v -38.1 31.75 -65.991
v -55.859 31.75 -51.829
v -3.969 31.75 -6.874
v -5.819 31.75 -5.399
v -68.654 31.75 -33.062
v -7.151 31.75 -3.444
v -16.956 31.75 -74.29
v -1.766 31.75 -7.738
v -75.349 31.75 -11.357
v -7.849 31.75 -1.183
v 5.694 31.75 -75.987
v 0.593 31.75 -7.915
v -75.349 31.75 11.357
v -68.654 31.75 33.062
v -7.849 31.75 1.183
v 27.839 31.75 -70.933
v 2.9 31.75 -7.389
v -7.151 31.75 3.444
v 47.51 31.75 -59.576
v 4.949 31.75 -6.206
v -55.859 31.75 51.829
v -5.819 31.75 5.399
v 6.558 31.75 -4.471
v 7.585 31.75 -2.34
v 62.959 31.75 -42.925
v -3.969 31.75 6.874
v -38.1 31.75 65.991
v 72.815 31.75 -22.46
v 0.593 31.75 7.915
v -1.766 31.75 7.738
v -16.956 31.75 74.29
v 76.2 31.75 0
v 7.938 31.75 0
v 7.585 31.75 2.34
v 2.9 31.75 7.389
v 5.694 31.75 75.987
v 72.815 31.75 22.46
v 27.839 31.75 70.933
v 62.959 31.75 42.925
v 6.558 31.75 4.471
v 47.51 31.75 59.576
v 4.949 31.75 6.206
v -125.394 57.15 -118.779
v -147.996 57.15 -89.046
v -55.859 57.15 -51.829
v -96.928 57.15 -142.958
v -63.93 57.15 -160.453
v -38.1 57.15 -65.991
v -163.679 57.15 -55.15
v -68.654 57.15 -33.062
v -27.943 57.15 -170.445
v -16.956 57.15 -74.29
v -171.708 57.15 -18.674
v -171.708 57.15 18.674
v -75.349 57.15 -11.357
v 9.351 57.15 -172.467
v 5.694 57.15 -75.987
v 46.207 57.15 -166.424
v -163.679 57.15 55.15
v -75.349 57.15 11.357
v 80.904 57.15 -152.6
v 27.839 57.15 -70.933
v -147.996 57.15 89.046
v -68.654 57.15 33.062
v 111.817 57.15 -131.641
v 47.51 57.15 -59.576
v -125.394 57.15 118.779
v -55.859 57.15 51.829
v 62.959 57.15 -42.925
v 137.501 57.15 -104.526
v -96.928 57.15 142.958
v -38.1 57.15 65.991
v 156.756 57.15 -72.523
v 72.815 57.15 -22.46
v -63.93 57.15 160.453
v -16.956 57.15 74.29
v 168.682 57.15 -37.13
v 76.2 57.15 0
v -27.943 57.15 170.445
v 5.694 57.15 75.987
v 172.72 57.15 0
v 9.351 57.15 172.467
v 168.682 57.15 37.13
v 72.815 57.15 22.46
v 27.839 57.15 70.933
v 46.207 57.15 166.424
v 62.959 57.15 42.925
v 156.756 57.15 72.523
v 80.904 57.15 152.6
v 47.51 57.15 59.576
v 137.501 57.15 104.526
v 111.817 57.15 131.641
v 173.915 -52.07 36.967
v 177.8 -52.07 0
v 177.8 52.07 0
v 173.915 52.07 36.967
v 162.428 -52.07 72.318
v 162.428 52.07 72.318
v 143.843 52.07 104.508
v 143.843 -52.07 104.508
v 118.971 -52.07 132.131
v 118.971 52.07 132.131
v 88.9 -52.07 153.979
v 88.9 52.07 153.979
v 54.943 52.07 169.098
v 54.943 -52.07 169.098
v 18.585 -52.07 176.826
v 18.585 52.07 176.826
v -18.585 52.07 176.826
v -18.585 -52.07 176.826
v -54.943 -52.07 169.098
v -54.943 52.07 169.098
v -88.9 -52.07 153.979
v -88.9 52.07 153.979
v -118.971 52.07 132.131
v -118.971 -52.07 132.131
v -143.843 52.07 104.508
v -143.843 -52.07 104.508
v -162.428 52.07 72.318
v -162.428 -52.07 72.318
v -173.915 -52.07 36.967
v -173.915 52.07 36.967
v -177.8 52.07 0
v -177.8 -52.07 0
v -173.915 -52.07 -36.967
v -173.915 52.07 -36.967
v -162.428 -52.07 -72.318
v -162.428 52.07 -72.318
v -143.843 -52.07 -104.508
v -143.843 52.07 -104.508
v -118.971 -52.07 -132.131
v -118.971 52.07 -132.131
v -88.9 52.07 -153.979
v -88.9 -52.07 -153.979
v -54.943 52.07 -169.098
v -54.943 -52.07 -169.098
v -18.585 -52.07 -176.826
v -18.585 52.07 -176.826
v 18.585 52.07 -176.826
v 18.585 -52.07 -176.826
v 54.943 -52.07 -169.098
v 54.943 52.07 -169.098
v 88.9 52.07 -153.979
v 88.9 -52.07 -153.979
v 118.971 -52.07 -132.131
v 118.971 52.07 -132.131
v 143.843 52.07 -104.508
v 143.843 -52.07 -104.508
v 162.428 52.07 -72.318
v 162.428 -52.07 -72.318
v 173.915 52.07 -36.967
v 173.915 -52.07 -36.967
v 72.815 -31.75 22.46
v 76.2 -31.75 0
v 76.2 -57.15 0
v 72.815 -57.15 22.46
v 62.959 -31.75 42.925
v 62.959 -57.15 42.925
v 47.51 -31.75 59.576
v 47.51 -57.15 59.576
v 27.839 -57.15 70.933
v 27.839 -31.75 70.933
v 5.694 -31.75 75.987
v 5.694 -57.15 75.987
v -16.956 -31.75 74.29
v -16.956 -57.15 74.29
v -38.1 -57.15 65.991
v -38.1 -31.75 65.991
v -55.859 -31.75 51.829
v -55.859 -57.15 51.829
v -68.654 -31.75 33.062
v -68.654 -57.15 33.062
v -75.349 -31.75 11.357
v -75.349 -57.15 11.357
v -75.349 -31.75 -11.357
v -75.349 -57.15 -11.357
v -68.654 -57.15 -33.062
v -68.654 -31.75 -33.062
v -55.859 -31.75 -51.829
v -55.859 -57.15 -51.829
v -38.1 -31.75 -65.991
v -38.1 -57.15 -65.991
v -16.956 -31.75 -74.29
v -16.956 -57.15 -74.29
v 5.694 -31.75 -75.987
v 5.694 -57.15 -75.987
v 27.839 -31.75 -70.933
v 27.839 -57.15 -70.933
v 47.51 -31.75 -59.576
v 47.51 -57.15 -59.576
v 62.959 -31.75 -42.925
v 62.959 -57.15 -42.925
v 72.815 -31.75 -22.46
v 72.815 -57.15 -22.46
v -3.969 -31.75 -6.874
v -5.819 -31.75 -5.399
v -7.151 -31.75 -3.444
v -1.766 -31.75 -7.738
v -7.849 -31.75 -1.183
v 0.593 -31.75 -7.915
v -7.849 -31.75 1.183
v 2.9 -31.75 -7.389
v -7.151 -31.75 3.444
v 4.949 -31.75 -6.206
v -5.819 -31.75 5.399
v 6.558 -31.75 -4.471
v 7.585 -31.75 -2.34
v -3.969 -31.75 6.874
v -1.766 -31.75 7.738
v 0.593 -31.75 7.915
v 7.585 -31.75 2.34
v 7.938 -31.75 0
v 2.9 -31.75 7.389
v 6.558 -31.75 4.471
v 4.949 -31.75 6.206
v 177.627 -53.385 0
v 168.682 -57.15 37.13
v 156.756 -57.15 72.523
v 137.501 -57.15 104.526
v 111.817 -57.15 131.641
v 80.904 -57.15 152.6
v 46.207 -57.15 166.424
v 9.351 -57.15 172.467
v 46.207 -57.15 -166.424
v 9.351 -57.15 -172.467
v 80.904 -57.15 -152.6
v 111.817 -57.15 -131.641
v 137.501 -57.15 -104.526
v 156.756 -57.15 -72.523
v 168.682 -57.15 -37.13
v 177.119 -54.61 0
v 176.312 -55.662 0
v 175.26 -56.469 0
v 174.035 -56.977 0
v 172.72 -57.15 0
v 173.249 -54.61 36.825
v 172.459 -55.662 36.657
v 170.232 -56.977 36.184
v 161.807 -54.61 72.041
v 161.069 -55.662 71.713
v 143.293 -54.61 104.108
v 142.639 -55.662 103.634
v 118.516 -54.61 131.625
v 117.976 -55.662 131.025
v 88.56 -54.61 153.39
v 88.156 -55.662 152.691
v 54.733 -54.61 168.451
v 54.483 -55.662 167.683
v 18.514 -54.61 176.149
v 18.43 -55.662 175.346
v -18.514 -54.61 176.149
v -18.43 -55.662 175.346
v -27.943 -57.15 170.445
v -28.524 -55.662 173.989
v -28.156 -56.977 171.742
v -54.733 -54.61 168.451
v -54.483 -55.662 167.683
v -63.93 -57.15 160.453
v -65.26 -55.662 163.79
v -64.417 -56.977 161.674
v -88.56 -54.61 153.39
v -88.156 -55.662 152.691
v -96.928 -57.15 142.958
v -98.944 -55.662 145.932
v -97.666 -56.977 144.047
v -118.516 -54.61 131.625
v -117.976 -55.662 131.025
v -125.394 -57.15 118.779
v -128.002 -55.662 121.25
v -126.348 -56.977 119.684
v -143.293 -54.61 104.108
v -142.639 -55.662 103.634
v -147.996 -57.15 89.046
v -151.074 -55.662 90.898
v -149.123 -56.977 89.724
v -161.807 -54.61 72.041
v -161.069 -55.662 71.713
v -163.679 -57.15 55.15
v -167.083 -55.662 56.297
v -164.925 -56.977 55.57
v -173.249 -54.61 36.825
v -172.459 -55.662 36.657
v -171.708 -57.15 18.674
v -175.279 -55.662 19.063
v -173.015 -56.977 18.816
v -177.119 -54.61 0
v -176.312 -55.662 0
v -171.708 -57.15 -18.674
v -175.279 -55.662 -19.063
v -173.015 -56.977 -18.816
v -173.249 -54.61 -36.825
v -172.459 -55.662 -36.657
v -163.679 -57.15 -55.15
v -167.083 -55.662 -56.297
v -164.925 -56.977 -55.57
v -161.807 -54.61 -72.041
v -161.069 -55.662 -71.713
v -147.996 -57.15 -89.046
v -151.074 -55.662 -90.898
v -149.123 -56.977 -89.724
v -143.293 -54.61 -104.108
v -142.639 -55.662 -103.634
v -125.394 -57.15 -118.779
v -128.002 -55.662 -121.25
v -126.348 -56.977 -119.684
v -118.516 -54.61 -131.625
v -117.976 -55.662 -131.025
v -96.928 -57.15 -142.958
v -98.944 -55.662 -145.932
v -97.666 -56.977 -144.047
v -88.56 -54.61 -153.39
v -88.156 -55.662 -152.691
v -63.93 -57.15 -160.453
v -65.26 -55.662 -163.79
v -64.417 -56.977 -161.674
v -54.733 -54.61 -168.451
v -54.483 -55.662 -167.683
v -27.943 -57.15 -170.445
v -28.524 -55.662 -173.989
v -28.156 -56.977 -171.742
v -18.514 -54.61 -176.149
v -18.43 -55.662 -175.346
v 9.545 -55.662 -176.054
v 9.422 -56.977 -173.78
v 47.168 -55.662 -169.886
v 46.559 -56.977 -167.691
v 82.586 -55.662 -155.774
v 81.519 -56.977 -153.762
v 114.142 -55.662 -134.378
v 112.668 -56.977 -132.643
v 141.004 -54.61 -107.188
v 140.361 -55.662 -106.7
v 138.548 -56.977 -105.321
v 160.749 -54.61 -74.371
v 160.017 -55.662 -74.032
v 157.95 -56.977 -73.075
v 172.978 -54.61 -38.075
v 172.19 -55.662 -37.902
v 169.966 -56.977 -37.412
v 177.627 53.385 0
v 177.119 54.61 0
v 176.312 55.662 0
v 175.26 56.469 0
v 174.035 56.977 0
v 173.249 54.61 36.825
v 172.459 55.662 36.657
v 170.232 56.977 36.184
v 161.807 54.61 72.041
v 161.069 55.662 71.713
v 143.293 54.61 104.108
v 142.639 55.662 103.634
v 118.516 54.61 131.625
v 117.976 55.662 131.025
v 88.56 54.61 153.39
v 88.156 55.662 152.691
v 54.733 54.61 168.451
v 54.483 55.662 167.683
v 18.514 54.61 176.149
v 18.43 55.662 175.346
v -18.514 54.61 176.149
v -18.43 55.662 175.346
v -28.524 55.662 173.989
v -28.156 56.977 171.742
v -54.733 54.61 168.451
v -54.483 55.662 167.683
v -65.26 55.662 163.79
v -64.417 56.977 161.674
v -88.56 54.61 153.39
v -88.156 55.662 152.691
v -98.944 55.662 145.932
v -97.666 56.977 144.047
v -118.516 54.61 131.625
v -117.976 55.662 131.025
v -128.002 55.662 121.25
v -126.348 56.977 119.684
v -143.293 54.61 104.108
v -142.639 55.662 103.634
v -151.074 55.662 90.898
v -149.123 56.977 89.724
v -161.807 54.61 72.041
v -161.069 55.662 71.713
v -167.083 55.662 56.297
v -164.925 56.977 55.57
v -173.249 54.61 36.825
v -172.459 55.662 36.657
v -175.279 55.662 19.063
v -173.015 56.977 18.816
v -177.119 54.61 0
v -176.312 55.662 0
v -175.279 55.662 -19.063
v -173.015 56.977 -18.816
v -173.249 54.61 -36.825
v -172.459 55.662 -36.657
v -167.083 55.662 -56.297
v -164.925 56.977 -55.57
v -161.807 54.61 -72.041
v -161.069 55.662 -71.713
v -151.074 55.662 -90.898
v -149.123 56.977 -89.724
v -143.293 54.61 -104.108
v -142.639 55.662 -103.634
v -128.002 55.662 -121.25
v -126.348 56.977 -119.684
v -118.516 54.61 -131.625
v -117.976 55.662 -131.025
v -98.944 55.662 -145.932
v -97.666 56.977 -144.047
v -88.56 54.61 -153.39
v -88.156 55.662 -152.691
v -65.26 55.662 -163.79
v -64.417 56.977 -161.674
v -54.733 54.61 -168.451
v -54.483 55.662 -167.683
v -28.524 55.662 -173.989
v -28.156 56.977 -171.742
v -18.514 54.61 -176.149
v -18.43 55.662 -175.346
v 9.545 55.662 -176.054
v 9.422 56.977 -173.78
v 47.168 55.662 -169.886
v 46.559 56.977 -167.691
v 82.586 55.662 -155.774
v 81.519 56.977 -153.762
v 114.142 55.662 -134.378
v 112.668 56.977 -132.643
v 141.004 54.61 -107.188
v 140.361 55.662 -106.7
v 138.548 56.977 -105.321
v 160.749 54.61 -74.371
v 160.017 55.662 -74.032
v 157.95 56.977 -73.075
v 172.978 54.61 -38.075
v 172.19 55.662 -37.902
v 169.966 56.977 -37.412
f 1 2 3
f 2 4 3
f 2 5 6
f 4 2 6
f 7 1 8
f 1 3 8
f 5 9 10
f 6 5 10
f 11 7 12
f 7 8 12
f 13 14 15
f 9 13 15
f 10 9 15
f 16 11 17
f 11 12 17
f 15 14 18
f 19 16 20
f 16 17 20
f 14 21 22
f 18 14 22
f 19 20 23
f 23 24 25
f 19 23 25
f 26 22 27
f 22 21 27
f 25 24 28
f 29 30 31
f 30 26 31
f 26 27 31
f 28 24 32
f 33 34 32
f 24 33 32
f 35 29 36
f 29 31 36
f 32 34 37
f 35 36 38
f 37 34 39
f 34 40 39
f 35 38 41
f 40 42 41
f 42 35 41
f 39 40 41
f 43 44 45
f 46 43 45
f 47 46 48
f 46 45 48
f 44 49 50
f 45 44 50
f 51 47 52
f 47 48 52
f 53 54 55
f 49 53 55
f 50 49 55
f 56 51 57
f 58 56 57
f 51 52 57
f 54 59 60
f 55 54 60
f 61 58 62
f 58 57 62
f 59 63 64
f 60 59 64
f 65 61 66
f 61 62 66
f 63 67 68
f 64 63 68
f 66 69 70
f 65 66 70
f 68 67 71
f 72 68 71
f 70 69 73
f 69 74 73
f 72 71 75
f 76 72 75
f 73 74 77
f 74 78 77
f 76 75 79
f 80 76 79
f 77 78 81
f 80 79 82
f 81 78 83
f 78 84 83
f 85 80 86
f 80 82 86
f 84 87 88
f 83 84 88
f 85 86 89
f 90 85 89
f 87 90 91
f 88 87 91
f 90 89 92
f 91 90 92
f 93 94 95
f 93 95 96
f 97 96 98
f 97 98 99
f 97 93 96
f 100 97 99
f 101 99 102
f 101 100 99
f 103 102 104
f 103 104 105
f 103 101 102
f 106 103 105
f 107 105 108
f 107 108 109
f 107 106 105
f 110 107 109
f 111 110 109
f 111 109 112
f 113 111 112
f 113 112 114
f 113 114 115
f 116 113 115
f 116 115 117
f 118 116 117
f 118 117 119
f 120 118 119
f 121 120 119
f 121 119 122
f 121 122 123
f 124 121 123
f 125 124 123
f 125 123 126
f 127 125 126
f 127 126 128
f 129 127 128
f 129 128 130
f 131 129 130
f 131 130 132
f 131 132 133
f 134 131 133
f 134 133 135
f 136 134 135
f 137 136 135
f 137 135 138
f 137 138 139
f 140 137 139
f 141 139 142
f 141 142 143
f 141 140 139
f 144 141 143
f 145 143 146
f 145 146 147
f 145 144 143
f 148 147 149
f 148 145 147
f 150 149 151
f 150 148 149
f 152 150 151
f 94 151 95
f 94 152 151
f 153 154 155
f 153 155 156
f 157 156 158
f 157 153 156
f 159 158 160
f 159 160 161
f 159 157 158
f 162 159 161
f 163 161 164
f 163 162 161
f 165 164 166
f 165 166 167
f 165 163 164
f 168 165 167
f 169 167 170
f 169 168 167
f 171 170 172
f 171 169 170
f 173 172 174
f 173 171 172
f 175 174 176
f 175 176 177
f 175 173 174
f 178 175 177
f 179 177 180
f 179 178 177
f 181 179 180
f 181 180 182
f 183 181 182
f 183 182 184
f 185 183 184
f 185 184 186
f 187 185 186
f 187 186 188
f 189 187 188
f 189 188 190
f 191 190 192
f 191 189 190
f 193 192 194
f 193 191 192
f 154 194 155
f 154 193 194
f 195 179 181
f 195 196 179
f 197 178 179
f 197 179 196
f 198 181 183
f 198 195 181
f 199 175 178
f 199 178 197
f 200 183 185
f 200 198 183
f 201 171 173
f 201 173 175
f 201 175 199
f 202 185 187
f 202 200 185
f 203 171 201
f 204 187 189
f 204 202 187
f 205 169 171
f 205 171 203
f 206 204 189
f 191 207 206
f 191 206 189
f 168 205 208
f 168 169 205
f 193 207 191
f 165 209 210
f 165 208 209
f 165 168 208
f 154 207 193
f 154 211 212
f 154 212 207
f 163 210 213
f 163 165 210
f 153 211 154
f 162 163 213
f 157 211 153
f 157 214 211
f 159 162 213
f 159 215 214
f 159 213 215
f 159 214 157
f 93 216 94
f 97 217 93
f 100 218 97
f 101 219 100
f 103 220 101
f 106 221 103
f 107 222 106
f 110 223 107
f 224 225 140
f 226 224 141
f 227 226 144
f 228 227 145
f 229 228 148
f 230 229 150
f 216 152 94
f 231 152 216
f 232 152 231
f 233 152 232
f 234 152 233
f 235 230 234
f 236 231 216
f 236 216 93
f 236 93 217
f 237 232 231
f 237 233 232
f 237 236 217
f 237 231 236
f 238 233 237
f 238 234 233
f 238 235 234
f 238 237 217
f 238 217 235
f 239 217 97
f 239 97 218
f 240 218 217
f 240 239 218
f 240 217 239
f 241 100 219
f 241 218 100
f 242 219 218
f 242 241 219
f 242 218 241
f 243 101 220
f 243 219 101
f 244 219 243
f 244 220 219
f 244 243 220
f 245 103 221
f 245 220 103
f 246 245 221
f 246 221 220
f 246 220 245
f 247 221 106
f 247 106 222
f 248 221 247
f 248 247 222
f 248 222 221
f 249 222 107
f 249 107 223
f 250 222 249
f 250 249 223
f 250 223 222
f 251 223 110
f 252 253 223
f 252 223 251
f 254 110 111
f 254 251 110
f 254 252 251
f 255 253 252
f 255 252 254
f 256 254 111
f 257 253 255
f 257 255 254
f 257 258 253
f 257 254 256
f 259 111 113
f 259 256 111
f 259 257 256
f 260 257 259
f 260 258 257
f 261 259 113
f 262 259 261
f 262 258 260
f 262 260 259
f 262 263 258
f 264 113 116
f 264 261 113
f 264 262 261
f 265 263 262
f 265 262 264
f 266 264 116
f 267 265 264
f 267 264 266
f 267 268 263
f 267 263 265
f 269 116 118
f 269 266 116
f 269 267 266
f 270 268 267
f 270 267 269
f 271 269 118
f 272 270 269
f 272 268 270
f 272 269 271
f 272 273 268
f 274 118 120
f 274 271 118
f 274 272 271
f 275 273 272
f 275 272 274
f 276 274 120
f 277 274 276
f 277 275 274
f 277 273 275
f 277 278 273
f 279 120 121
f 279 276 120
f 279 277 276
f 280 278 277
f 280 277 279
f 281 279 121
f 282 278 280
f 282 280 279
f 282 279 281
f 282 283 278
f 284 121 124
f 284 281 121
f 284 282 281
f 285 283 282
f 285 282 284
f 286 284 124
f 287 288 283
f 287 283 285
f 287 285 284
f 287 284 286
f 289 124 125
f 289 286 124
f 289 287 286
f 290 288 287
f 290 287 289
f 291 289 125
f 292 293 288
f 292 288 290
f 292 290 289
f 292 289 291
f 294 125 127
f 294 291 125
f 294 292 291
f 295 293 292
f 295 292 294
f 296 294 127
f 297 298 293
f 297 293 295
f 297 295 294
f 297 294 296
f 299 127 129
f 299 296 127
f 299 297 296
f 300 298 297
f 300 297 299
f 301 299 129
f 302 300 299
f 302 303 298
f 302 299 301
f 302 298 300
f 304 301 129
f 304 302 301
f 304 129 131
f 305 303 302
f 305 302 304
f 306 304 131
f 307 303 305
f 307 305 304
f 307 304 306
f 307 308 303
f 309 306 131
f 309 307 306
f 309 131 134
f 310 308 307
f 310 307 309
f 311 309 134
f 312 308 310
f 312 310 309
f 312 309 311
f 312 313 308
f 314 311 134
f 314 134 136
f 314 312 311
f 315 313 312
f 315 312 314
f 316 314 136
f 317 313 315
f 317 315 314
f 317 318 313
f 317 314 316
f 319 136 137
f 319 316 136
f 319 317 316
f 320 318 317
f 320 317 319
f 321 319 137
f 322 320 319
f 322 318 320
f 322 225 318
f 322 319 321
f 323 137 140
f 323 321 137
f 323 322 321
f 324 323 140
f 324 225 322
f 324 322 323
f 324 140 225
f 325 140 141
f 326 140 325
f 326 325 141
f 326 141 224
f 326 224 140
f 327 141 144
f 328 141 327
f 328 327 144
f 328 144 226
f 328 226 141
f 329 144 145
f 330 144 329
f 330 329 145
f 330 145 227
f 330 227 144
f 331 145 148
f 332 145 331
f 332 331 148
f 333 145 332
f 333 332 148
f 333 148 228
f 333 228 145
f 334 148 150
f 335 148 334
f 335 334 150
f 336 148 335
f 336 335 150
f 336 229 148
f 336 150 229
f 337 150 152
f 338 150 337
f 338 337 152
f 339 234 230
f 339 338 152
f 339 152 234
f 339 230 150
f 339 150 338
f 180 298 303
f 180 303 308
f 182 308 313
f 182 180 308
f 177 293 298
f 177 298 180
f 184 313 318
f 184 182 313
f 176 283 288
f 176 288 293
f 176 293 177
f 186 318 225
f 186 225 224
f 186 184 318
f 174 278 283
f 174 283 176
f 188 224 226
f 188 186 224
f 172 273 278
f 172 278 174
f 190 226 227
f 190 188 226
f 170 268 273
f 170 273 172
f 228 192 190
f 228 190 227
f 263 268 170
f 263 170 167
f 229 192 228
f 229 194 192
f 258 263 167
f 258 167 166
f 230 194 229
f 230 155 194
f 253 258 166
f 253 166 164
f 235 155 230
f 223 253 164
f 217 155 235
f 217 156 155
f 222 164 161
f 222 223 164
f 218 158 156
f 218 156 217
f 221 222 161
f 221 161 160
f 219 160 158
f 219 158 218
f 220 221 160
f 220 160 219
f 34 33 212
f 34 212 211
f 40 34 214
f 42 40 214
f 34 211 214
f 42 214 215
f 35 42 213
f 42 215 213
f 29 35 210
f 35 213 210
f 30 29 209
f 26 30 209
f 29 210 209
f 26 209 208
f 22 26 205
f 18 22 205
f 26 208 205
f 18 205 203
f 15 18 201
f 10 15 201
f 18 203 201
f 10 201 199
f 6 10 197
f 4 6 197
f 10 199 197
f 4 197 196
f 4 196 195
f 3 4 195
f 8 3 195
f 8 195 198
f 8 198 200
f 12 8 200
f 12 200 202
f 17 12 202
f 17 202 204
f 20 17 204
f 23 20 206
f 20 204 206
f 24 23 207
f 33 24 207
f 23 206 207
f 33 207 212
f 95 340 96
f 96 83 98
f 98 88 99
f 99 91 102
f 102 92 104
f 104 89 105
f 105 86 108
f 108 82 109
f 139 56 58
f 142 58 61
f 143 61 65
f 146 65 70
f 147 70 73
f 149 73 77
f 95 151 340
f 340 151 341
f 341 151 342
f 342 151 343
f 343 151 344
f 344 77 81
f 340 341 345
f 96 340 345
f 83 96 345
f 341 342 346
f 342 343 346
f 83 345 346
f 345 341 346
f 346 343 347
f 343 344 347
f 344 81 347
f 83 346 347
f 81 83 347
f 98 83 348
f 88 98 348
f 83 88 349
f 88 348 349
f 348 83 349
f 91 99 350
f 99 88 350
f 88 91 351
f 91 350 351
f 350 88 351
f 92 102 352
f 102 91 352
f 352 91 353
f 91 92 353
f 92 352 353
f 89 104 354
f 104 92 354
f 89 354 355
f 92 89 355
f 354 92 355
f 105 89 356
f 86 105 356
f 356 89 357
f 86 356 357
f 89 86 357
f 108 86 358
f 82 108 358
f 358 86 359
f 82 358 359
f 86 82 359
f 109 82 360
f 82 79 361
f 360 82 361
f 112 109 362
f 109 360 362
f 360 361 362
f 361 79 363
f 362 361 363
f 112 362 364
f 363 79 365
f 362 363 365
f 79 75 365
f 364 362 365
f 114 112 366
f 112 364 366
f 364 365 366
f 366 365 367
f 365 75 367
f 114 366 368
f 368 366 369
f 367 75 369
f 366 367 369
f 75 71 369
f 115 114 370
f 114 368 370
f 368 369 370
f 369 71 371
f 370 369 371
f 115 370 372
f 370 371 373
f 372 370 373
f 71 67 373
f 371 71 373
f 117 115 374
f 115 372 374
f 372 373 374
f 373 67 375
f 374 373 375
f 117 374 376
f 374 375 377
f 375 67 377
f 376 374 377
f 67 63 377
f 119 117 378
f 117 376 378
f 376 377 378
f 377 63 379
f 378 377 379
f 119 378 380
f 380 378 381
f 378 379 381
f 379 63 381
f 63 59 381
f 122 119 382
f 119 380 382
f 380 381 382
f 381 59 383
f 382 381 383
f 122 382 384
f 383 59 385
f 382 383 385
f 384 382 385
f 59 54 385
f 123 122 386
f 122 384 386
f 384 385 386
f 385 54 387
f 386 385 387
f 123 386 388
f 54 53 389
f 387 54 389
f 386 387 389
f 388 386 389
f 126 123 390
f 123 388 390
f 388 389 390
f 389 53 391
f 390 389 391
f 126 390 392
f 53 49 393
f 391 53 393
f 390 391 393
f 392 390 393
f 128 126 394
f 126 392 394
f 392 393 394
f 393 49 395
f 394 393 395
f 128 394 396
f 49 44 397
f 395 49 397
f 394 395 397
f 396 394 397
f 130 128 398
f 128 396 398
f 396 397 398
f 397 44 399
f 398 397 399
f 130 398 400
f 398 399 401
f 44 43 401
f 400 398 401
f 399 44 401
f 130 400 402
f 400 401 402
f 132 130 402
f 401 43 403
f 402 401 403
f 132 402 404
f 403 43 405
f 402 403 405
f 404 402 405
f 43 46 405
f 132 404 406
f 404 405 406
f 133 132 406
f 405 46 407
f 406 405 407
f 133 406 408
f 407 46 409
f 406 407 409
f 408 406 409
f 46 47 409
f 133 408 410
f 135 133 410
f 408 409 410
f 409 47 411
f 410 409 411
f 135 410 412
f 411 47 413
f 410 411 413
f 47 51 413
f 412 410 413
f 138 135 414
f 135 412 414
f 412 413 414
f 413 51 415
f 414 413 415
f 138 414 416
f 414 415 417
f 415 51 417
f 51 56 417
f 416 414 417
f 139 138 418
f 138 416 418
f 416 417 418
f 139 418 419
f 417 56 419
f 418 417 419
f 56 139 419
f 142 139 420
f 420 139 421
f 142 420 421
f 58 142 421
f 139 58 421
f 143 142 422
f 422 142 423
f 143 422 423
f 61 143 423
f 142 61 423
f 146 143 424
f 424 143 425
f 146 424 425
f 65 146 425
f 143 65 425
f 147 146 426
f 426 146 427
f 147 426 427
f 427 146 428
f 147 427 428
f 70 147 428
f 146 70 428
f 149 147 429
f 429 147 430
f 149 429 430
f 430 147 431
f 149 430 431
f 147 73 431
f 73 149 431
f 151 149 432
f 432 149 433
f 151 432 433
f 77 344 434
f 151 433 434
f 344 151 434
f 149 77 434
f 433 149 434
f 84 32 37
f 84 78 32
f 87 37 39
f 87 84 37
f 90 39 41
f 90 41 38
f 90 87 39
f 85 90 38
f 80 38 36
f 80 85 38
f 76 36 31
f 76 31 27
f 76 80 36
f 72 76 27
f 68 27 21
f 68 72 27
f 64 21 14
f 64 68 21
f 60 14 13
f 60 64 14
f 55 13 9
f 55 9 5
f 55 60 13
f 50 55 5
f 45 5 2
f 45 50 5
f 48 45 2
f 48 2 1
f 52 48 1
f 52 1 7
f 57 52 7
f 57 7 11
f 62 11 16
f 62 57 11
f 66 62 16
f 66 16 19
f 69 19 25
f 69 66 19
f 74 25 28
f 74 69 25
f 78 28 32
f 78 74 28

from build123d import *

# Parameters (mm, degrees)
F0_R     = 177.8
F0_R_2   = 76.2
F1_DEPTH = 57.15
F2_R     = 76.2
F3_DEPTH = 31.75
F4_R     = 7.9375
F5_DEPTH = 63.5
F6_R     = 5.08


with BuildPart() as f1:
    # F0 (on Front) → F1 (new body, symmetric)
    with BuildSketch(Plane.XZ):
        Circle(F0_R)
        Circle(F0_R_2, mode=Mode.SUBTRACT)
    extrude(amount=F1_DEPTH, both=True)

    # F2 (on Front) → F3 (join, symmetric)
    with BuildSketch(Plane.XZ):
        Circle(F2_R)
    extrude(amount=F3_DEPTH, both=True)

    # F4 (on face) → F5 (cut, symmetric)
    with BuildSketch(Plane.XZ.offset(31.75)):
        Circle(F4_R)
    extrude(amount=F5_DEPTH, both=True, mode=Mode.SUBTRACT)

    # F6
    f6_edges = [f1.edges().sort_by_distance(p)[0] for p in [
        (-177.8, -57.15, 0),
        (-177.8, 57.15, 0),
    ]]
    fillet(f6_edges, radius=F6_R)


solid = f1.part
